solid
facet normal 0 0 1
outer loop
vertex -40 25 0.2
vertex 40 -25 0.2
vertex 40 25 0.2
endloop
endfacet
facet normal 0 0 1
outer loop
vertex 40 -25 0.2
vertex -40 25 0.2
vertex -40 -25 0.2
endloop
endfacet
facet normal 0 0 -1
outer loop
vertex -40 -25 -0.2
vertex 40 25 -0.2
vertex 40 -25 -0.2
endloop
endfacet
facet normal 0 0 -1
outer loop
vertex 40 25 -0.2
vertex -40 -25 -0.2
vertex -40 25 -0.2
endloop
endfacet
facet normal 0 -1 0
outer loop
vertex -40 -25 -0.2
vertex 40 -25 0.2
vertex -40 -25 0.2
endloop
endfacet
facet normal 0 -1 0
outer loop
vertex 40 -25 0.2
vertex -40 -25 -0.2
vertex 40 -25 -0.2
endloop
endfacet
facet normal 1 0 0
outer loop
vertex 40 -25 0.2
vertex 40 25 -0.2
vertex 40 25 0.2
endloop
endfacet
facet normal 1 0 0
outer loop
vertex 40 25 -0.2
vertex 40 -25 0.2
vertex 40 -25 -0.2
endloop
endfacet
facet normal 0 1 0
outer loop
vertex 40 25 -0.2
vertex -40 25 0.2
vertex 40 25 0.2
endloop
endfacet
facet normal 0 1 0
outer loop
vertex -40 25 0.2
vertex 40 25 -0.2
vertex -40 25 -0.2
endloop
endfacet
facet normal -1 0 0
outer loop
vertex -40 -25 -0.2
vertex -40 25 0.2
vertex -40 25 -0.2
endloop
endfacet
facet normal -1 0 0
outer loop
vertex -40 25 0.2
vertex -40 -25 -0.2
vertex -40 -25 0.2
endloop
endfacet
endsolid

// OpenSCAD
// Заведомо плохая деталь: стенка 0.4 мм — аудит должен зарубить (thin_feature_warning)
cube([80, 50, 0.4], center=true);
